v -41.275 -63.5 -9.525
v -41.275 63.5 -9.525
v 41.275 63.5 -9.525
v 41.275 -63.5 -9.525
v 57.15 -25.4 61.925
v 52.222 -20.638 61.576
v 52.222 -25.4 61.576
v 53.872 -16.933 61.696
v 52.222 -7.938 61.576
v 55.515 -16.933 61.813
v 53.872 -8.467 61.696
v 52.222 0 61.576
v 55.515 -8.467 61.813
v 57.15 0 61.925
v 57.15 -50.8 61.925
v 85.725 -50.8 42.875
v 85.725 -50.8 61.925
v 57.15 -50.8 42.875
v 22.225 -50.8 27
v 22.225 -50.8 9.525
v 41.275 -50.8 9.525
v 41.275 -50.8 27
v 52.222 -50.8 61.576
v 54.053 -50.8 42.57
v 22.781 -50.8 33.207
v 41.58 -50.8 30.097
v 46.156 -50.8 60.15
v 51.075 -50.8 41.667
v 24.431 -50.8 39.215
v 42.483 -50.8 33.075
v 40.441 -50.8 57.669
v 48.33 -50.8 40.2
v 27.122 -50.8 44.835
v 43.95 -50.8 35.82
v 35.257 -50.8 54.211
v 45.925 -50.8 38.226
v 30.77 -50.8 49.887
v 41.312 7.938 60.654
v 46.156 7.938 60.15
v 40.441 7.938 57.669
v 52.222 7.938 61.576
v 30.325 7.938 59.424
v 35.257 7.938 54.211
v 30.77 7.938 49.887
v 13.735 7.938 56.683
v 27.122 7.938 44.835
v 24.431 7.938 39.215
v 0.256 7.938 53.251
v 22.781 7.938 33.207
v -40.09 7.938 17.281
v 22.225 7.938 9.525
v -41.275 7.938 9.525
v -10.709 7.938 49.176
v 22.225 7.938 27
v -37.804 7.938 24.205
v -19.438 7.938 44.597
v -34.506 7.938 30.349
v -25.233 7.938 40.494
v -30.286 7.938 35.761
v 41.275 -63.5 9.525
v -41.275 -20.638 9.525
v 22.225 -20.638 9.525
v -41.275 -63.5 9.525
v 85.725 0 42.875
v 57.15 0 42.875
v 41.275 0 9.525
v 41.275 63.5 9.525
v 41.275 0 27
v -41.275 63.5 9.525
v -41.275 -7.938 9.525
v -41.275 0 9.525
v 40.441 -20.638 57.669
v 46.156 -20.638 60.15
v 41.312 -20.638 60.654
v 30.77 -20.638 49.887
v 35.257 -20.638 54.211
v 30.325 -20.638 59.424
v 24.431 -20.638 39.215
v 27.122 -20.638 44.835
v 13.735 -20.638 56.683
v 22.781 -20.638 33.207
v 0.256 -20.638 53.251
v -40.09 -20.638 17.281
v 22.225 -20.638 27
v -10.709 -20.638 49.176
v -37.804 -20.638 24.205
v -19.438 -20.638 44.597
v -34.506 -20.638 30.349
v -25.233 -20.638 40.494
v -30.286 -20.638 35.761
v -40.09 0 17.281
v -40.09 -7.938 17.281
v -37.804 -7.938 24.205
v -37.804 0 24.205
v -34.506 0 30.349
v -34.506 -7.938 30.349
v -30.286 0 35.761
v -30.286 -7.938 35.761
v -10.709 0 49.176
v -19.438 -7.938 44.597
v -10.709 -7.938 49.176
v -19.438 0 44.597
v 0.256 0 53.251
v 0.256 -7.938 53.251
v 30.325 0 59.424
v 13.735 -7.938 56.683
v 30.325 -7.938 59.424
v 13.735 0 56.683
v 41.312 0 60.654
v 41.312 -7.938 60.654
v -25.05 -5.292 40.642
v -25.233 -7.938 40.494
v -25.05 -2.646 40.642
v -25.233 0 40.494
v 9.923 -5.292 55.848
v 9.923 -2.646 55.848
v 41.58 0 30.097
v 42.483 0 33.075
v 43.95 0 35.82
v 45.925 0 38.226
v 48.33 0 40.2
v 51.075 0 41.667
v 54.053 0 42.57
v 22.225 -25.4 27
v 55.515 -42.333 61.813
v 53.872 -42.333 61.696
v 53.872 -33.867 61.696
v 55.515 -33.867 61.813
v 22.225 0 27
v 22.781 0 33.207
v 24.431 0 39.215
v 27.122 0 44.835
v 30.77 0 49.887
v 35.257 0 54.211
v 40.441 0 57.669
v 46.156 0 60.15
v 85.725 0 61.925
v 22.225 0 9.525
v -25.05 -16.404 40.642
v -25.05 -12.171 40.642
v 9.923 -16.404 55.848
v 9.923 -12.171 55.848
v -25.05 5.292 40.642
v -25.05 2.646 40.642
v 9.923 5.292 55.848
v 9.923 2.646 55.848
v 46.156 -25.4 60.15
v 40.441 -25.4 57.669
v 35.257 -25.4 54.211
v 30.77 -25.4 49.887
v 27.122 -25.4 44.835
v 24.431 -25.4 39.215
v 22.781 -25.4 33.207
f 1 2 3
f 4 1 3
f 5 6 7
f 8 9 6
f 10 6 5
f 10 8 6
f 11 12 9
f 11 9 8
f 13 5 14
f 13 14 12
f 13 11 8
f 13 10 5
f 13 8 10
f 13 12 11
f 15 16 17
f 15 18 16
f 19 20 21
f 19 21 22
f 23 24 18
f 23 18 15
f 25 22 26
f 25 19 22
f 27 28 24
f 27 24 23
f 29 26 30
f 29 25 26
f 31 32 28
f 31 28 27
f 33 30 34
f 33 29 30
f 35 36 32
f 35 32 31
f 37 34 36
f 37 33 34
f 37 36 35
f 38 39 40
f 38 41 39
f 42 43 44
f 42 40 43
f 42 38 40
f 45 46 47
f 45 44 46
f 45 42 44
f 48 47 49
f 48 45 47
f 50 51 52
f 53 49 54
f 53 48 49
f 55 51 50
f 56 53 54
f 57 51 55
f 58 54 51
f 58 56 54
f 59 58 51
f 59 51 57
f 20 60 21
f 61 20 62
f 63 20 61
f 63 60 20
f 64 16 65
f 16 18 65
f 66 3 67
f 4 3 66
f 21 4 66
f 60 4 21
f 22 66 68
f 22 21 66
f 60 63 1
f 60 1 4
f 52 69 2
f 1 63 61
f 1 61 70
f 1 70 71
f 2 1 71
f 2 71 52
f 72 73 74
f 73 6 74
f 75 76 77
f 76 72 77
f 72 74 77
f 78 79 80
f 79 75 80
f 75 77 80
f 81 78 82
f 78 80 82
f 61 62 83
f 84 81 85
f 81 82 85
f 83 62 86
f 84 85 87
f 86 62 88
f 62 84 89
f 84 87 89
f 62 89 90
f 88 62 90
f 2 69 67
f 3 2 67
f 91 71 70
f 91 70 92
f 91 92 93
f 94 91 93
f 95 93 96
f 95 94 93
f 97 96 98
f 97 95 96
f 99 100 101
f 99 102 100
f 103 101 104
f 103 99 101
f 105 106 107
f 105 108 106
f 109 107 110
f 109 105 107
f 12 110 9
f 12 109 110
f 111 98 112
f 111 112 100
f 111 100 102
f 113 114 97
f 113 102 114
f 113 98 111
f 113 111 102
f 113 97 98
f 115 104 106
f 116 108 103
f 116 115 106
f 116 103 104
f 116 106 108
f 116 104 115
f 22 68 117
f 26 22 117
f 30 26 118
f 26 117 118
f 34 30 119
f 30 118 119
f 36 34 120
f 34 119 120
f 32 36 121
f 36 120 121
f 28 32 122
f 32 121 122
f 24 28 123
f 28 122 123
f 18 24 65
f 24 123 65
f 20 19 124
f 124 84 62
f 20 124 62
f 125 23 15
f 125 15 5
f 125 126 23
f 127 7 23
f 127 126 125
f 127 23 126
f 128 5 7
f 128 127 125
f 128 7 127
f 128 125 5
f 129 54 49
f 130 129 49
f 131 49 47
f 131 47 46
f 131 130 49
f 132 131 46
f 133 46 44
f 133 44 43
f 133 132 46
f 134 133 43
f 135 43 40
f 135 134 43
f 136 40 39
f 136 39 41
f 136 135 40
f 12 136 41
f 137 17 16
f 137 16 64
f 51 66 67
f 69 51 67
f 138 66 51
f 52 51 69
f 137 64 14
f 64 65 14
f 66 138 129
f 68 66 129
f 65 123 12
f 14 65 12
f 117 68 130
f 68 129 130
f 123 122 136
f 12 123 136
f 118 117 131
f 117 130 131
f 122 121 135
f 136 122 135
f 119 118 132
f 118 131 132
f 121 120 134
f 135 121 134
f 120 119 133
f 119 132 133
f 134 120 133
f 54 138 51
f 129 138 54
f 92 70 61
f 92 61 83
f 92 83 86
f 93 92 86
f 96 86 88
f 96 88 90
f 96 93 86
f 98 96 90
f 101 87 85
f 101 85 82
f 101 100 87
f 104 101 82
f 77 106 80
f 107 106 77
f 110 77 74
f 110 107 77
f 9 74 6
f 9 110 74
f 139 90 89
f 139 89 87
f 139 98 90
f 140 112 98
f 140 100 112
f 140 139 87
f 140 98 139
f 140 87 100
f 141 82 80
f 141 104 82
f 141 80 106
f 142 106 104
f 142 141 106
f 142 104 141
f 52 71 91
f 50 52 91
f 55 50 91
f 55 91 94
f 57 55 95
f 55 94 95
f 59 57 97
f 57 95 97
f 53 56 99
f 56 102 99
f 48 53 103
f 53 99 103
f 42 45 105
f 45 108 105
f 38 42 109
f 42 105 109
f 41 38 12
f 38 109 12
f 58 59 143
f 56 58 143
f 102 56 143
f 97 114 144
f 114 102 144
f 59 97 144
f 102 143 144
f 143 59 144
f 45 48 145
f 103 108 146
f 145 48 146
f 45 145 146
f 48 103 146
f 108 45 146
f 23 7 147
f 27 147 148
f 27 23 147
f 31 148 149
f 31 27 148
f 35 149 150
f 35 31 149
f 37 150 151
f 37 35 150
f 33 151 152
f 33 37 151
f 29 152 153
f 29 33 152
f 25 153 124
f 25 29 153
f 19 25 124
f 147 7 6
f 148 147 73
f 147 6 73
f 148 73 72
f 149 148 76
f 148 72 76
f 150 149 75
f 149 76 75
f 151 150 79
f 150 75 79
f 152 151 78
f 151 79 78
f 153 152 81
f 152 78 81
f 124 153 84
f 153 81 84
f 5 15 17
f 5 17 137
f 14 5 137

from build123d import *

# Parameters (mm, degrees)
F1_DEPTH  = 63.5
F2_DEPTH  = 25.4
F3_DEPTH  = 25.4
F3_FACE_W = 50.8
F3_FACE_H = 19.05
F4_DEPTH  = 25.4
F5_DEPTH  = 7.9375
F6_DEPTH  = 12.7


with BuildPart() as f1:
    # F0 (on Front) → F1 (new body, symmetric)
    with BuildSketch(Plane.XZ):
        Polygon((22.225, 9.525), (-41.275, 9.525), (-41.275, -9.525), (41.275, -9.525), (41.275, 9.525), align=None)
    extrude(amount=F1_DEPTH, both=True)

    # F0 (on Front) → F2 (join)
    with BuildSketch(Plane.XZ):
        with BuildLine():
            Line((22.225, 27.0002), (22.225, 9.525))
            Line((22.225, 9.525), (41.275, 9.525))
            Line((41.275, 9.525), (41.275, 27.0002))
            ThreePointArc((41.275, 27.0002), (45.92468, 38.22552), (57.15, 42.8752))
            Line((57.15, 42.8752), (60.325, 42.8752))
            Line((60.325, 42.8752), (60.325, 61.9252))
            Line((60.325, 61.9252), (57.15, 61.9252))
            add(Edge.make_bspline(
                [(52.222263, 61.575813), (53.87533, 61.698715), (55.518942, 61.814596), (57.15, 61.9252)],
                knots=[107.296838, 107.296838, 107.296838, 107.296838, 111.504536, 111.504536, 111.504536, 111.504536], degree=3))
            ThreePointArc((52.222263, 61.575813), (30.769545, 49.887472), (22.225, 27.0002))
        make_face()
    extrude(amount=F2_DEPTH)

    # F2_face (on face) → F3 (join, symmetric)
    with BuildSketch(Plane(origin=(38.743879, -25.4, 36.959126), x_dir=(1, 0, 0), z_dir=(0, -1, 0))):
        with BuildLine():
            ThreePointArc((13.478383, 24.616687), (-7.974335, 12.928345), (-16.518879, -9.958926))
            Line((-16.518879, -9.958926), (-16.518879, -27.434126))
            Line((-16.518879, -27.434126), (2.531121, -27.434126))
            Line((2.531121, -27.434126), (2.531121, -9.958926))
            ThreePointArc((2.531121, -9.958926), (7.180801, 1.266394), (18.406121, 5.916074))
            Line((18.406121, 5.916074), (21.581121, 5.916074))
            Line((21.581121, 5.916074), (21.581121, 24.966074))
            Line((21.581121, 24.966074), (18.406121, 24.966074))
            add(Edge.make_bspline(
                [(13.478383, 24.616687), (15.131451, 24.739589), (16.775063, 24.855469), (18.406121, 24.966074)],
                knots=[107.296838, 107.296838, 107.296838, 107.296838, 111.504536, 111.504536, 111.504536, 111.504536], degree=3))
        make_face()
    extrude(amount=F3_DEPTH, both=True)

    # F3_face (on face) → F4 (join)
    with BuildSketch(Plane(origin=(60.325, -25.4, 52.4002), x_dir=(0, 1, 0), z_dir=(1, 0, 0))):
        Rectangle(F3_FACE_W, F3_FACE_H)
    extrude(amount=F4_DEPTH)

    # F0 (on Front) → F5 (join, symmetric)
    with BuildSketch(Plane.XZ):
        with BuildLine():
            add(Edge.make_bspline(
                [(-41.275, 9.525), (-38.232598, 50.741845), (10.068833, 58.441796), (52.222263, 61.575813)],
                knots=[0, 0, 0, 0, 107.296838, 107.296838, 107.296838, 107.296838], degree=3))
            Line((-41.275, 9.525), (22.225, 9.525))
            Line((22.225, 9.525), (22.225, 27.0002))
            ThreePointArc((22.225, 27.0002), (30.769545, 49.887472), (52.222263, 61.575813))
        make_face()
    extrude(amount=F5_DEPTH, both=True)

    # F5_face (on face) → F6 (join, symmetric)
    with BuildSketch(Plane(origin=(-1.735733, -7.9375, 31.373848), x_dir=(1, 0, 0), z_dir=(0, -1, 0))):
        with BuildLine():
            add(Edge.make_bspline(
                [(-39.539267, -21.848848), (-36.496865, 19.367997), (11.804566, 27.067948), (53.957996, 30.201965)],
                knots=[0, 0, 0, 0, 107.296838, 107.296838, 107.296838, 107.296838], degree=3))
            Line((-39.539267, -21.848848), (23.960733, -21.848848))
            Line((23.960733, -21.848848), (23.960733, -4.373648))
            ThreePointArc((23.960733, -4.373648), (32.505278, 18.513623), (53.957996, 30.201965))
        make_face()
    extrude(amount=F6_DEPTH, both=True)


solid = f1.part
